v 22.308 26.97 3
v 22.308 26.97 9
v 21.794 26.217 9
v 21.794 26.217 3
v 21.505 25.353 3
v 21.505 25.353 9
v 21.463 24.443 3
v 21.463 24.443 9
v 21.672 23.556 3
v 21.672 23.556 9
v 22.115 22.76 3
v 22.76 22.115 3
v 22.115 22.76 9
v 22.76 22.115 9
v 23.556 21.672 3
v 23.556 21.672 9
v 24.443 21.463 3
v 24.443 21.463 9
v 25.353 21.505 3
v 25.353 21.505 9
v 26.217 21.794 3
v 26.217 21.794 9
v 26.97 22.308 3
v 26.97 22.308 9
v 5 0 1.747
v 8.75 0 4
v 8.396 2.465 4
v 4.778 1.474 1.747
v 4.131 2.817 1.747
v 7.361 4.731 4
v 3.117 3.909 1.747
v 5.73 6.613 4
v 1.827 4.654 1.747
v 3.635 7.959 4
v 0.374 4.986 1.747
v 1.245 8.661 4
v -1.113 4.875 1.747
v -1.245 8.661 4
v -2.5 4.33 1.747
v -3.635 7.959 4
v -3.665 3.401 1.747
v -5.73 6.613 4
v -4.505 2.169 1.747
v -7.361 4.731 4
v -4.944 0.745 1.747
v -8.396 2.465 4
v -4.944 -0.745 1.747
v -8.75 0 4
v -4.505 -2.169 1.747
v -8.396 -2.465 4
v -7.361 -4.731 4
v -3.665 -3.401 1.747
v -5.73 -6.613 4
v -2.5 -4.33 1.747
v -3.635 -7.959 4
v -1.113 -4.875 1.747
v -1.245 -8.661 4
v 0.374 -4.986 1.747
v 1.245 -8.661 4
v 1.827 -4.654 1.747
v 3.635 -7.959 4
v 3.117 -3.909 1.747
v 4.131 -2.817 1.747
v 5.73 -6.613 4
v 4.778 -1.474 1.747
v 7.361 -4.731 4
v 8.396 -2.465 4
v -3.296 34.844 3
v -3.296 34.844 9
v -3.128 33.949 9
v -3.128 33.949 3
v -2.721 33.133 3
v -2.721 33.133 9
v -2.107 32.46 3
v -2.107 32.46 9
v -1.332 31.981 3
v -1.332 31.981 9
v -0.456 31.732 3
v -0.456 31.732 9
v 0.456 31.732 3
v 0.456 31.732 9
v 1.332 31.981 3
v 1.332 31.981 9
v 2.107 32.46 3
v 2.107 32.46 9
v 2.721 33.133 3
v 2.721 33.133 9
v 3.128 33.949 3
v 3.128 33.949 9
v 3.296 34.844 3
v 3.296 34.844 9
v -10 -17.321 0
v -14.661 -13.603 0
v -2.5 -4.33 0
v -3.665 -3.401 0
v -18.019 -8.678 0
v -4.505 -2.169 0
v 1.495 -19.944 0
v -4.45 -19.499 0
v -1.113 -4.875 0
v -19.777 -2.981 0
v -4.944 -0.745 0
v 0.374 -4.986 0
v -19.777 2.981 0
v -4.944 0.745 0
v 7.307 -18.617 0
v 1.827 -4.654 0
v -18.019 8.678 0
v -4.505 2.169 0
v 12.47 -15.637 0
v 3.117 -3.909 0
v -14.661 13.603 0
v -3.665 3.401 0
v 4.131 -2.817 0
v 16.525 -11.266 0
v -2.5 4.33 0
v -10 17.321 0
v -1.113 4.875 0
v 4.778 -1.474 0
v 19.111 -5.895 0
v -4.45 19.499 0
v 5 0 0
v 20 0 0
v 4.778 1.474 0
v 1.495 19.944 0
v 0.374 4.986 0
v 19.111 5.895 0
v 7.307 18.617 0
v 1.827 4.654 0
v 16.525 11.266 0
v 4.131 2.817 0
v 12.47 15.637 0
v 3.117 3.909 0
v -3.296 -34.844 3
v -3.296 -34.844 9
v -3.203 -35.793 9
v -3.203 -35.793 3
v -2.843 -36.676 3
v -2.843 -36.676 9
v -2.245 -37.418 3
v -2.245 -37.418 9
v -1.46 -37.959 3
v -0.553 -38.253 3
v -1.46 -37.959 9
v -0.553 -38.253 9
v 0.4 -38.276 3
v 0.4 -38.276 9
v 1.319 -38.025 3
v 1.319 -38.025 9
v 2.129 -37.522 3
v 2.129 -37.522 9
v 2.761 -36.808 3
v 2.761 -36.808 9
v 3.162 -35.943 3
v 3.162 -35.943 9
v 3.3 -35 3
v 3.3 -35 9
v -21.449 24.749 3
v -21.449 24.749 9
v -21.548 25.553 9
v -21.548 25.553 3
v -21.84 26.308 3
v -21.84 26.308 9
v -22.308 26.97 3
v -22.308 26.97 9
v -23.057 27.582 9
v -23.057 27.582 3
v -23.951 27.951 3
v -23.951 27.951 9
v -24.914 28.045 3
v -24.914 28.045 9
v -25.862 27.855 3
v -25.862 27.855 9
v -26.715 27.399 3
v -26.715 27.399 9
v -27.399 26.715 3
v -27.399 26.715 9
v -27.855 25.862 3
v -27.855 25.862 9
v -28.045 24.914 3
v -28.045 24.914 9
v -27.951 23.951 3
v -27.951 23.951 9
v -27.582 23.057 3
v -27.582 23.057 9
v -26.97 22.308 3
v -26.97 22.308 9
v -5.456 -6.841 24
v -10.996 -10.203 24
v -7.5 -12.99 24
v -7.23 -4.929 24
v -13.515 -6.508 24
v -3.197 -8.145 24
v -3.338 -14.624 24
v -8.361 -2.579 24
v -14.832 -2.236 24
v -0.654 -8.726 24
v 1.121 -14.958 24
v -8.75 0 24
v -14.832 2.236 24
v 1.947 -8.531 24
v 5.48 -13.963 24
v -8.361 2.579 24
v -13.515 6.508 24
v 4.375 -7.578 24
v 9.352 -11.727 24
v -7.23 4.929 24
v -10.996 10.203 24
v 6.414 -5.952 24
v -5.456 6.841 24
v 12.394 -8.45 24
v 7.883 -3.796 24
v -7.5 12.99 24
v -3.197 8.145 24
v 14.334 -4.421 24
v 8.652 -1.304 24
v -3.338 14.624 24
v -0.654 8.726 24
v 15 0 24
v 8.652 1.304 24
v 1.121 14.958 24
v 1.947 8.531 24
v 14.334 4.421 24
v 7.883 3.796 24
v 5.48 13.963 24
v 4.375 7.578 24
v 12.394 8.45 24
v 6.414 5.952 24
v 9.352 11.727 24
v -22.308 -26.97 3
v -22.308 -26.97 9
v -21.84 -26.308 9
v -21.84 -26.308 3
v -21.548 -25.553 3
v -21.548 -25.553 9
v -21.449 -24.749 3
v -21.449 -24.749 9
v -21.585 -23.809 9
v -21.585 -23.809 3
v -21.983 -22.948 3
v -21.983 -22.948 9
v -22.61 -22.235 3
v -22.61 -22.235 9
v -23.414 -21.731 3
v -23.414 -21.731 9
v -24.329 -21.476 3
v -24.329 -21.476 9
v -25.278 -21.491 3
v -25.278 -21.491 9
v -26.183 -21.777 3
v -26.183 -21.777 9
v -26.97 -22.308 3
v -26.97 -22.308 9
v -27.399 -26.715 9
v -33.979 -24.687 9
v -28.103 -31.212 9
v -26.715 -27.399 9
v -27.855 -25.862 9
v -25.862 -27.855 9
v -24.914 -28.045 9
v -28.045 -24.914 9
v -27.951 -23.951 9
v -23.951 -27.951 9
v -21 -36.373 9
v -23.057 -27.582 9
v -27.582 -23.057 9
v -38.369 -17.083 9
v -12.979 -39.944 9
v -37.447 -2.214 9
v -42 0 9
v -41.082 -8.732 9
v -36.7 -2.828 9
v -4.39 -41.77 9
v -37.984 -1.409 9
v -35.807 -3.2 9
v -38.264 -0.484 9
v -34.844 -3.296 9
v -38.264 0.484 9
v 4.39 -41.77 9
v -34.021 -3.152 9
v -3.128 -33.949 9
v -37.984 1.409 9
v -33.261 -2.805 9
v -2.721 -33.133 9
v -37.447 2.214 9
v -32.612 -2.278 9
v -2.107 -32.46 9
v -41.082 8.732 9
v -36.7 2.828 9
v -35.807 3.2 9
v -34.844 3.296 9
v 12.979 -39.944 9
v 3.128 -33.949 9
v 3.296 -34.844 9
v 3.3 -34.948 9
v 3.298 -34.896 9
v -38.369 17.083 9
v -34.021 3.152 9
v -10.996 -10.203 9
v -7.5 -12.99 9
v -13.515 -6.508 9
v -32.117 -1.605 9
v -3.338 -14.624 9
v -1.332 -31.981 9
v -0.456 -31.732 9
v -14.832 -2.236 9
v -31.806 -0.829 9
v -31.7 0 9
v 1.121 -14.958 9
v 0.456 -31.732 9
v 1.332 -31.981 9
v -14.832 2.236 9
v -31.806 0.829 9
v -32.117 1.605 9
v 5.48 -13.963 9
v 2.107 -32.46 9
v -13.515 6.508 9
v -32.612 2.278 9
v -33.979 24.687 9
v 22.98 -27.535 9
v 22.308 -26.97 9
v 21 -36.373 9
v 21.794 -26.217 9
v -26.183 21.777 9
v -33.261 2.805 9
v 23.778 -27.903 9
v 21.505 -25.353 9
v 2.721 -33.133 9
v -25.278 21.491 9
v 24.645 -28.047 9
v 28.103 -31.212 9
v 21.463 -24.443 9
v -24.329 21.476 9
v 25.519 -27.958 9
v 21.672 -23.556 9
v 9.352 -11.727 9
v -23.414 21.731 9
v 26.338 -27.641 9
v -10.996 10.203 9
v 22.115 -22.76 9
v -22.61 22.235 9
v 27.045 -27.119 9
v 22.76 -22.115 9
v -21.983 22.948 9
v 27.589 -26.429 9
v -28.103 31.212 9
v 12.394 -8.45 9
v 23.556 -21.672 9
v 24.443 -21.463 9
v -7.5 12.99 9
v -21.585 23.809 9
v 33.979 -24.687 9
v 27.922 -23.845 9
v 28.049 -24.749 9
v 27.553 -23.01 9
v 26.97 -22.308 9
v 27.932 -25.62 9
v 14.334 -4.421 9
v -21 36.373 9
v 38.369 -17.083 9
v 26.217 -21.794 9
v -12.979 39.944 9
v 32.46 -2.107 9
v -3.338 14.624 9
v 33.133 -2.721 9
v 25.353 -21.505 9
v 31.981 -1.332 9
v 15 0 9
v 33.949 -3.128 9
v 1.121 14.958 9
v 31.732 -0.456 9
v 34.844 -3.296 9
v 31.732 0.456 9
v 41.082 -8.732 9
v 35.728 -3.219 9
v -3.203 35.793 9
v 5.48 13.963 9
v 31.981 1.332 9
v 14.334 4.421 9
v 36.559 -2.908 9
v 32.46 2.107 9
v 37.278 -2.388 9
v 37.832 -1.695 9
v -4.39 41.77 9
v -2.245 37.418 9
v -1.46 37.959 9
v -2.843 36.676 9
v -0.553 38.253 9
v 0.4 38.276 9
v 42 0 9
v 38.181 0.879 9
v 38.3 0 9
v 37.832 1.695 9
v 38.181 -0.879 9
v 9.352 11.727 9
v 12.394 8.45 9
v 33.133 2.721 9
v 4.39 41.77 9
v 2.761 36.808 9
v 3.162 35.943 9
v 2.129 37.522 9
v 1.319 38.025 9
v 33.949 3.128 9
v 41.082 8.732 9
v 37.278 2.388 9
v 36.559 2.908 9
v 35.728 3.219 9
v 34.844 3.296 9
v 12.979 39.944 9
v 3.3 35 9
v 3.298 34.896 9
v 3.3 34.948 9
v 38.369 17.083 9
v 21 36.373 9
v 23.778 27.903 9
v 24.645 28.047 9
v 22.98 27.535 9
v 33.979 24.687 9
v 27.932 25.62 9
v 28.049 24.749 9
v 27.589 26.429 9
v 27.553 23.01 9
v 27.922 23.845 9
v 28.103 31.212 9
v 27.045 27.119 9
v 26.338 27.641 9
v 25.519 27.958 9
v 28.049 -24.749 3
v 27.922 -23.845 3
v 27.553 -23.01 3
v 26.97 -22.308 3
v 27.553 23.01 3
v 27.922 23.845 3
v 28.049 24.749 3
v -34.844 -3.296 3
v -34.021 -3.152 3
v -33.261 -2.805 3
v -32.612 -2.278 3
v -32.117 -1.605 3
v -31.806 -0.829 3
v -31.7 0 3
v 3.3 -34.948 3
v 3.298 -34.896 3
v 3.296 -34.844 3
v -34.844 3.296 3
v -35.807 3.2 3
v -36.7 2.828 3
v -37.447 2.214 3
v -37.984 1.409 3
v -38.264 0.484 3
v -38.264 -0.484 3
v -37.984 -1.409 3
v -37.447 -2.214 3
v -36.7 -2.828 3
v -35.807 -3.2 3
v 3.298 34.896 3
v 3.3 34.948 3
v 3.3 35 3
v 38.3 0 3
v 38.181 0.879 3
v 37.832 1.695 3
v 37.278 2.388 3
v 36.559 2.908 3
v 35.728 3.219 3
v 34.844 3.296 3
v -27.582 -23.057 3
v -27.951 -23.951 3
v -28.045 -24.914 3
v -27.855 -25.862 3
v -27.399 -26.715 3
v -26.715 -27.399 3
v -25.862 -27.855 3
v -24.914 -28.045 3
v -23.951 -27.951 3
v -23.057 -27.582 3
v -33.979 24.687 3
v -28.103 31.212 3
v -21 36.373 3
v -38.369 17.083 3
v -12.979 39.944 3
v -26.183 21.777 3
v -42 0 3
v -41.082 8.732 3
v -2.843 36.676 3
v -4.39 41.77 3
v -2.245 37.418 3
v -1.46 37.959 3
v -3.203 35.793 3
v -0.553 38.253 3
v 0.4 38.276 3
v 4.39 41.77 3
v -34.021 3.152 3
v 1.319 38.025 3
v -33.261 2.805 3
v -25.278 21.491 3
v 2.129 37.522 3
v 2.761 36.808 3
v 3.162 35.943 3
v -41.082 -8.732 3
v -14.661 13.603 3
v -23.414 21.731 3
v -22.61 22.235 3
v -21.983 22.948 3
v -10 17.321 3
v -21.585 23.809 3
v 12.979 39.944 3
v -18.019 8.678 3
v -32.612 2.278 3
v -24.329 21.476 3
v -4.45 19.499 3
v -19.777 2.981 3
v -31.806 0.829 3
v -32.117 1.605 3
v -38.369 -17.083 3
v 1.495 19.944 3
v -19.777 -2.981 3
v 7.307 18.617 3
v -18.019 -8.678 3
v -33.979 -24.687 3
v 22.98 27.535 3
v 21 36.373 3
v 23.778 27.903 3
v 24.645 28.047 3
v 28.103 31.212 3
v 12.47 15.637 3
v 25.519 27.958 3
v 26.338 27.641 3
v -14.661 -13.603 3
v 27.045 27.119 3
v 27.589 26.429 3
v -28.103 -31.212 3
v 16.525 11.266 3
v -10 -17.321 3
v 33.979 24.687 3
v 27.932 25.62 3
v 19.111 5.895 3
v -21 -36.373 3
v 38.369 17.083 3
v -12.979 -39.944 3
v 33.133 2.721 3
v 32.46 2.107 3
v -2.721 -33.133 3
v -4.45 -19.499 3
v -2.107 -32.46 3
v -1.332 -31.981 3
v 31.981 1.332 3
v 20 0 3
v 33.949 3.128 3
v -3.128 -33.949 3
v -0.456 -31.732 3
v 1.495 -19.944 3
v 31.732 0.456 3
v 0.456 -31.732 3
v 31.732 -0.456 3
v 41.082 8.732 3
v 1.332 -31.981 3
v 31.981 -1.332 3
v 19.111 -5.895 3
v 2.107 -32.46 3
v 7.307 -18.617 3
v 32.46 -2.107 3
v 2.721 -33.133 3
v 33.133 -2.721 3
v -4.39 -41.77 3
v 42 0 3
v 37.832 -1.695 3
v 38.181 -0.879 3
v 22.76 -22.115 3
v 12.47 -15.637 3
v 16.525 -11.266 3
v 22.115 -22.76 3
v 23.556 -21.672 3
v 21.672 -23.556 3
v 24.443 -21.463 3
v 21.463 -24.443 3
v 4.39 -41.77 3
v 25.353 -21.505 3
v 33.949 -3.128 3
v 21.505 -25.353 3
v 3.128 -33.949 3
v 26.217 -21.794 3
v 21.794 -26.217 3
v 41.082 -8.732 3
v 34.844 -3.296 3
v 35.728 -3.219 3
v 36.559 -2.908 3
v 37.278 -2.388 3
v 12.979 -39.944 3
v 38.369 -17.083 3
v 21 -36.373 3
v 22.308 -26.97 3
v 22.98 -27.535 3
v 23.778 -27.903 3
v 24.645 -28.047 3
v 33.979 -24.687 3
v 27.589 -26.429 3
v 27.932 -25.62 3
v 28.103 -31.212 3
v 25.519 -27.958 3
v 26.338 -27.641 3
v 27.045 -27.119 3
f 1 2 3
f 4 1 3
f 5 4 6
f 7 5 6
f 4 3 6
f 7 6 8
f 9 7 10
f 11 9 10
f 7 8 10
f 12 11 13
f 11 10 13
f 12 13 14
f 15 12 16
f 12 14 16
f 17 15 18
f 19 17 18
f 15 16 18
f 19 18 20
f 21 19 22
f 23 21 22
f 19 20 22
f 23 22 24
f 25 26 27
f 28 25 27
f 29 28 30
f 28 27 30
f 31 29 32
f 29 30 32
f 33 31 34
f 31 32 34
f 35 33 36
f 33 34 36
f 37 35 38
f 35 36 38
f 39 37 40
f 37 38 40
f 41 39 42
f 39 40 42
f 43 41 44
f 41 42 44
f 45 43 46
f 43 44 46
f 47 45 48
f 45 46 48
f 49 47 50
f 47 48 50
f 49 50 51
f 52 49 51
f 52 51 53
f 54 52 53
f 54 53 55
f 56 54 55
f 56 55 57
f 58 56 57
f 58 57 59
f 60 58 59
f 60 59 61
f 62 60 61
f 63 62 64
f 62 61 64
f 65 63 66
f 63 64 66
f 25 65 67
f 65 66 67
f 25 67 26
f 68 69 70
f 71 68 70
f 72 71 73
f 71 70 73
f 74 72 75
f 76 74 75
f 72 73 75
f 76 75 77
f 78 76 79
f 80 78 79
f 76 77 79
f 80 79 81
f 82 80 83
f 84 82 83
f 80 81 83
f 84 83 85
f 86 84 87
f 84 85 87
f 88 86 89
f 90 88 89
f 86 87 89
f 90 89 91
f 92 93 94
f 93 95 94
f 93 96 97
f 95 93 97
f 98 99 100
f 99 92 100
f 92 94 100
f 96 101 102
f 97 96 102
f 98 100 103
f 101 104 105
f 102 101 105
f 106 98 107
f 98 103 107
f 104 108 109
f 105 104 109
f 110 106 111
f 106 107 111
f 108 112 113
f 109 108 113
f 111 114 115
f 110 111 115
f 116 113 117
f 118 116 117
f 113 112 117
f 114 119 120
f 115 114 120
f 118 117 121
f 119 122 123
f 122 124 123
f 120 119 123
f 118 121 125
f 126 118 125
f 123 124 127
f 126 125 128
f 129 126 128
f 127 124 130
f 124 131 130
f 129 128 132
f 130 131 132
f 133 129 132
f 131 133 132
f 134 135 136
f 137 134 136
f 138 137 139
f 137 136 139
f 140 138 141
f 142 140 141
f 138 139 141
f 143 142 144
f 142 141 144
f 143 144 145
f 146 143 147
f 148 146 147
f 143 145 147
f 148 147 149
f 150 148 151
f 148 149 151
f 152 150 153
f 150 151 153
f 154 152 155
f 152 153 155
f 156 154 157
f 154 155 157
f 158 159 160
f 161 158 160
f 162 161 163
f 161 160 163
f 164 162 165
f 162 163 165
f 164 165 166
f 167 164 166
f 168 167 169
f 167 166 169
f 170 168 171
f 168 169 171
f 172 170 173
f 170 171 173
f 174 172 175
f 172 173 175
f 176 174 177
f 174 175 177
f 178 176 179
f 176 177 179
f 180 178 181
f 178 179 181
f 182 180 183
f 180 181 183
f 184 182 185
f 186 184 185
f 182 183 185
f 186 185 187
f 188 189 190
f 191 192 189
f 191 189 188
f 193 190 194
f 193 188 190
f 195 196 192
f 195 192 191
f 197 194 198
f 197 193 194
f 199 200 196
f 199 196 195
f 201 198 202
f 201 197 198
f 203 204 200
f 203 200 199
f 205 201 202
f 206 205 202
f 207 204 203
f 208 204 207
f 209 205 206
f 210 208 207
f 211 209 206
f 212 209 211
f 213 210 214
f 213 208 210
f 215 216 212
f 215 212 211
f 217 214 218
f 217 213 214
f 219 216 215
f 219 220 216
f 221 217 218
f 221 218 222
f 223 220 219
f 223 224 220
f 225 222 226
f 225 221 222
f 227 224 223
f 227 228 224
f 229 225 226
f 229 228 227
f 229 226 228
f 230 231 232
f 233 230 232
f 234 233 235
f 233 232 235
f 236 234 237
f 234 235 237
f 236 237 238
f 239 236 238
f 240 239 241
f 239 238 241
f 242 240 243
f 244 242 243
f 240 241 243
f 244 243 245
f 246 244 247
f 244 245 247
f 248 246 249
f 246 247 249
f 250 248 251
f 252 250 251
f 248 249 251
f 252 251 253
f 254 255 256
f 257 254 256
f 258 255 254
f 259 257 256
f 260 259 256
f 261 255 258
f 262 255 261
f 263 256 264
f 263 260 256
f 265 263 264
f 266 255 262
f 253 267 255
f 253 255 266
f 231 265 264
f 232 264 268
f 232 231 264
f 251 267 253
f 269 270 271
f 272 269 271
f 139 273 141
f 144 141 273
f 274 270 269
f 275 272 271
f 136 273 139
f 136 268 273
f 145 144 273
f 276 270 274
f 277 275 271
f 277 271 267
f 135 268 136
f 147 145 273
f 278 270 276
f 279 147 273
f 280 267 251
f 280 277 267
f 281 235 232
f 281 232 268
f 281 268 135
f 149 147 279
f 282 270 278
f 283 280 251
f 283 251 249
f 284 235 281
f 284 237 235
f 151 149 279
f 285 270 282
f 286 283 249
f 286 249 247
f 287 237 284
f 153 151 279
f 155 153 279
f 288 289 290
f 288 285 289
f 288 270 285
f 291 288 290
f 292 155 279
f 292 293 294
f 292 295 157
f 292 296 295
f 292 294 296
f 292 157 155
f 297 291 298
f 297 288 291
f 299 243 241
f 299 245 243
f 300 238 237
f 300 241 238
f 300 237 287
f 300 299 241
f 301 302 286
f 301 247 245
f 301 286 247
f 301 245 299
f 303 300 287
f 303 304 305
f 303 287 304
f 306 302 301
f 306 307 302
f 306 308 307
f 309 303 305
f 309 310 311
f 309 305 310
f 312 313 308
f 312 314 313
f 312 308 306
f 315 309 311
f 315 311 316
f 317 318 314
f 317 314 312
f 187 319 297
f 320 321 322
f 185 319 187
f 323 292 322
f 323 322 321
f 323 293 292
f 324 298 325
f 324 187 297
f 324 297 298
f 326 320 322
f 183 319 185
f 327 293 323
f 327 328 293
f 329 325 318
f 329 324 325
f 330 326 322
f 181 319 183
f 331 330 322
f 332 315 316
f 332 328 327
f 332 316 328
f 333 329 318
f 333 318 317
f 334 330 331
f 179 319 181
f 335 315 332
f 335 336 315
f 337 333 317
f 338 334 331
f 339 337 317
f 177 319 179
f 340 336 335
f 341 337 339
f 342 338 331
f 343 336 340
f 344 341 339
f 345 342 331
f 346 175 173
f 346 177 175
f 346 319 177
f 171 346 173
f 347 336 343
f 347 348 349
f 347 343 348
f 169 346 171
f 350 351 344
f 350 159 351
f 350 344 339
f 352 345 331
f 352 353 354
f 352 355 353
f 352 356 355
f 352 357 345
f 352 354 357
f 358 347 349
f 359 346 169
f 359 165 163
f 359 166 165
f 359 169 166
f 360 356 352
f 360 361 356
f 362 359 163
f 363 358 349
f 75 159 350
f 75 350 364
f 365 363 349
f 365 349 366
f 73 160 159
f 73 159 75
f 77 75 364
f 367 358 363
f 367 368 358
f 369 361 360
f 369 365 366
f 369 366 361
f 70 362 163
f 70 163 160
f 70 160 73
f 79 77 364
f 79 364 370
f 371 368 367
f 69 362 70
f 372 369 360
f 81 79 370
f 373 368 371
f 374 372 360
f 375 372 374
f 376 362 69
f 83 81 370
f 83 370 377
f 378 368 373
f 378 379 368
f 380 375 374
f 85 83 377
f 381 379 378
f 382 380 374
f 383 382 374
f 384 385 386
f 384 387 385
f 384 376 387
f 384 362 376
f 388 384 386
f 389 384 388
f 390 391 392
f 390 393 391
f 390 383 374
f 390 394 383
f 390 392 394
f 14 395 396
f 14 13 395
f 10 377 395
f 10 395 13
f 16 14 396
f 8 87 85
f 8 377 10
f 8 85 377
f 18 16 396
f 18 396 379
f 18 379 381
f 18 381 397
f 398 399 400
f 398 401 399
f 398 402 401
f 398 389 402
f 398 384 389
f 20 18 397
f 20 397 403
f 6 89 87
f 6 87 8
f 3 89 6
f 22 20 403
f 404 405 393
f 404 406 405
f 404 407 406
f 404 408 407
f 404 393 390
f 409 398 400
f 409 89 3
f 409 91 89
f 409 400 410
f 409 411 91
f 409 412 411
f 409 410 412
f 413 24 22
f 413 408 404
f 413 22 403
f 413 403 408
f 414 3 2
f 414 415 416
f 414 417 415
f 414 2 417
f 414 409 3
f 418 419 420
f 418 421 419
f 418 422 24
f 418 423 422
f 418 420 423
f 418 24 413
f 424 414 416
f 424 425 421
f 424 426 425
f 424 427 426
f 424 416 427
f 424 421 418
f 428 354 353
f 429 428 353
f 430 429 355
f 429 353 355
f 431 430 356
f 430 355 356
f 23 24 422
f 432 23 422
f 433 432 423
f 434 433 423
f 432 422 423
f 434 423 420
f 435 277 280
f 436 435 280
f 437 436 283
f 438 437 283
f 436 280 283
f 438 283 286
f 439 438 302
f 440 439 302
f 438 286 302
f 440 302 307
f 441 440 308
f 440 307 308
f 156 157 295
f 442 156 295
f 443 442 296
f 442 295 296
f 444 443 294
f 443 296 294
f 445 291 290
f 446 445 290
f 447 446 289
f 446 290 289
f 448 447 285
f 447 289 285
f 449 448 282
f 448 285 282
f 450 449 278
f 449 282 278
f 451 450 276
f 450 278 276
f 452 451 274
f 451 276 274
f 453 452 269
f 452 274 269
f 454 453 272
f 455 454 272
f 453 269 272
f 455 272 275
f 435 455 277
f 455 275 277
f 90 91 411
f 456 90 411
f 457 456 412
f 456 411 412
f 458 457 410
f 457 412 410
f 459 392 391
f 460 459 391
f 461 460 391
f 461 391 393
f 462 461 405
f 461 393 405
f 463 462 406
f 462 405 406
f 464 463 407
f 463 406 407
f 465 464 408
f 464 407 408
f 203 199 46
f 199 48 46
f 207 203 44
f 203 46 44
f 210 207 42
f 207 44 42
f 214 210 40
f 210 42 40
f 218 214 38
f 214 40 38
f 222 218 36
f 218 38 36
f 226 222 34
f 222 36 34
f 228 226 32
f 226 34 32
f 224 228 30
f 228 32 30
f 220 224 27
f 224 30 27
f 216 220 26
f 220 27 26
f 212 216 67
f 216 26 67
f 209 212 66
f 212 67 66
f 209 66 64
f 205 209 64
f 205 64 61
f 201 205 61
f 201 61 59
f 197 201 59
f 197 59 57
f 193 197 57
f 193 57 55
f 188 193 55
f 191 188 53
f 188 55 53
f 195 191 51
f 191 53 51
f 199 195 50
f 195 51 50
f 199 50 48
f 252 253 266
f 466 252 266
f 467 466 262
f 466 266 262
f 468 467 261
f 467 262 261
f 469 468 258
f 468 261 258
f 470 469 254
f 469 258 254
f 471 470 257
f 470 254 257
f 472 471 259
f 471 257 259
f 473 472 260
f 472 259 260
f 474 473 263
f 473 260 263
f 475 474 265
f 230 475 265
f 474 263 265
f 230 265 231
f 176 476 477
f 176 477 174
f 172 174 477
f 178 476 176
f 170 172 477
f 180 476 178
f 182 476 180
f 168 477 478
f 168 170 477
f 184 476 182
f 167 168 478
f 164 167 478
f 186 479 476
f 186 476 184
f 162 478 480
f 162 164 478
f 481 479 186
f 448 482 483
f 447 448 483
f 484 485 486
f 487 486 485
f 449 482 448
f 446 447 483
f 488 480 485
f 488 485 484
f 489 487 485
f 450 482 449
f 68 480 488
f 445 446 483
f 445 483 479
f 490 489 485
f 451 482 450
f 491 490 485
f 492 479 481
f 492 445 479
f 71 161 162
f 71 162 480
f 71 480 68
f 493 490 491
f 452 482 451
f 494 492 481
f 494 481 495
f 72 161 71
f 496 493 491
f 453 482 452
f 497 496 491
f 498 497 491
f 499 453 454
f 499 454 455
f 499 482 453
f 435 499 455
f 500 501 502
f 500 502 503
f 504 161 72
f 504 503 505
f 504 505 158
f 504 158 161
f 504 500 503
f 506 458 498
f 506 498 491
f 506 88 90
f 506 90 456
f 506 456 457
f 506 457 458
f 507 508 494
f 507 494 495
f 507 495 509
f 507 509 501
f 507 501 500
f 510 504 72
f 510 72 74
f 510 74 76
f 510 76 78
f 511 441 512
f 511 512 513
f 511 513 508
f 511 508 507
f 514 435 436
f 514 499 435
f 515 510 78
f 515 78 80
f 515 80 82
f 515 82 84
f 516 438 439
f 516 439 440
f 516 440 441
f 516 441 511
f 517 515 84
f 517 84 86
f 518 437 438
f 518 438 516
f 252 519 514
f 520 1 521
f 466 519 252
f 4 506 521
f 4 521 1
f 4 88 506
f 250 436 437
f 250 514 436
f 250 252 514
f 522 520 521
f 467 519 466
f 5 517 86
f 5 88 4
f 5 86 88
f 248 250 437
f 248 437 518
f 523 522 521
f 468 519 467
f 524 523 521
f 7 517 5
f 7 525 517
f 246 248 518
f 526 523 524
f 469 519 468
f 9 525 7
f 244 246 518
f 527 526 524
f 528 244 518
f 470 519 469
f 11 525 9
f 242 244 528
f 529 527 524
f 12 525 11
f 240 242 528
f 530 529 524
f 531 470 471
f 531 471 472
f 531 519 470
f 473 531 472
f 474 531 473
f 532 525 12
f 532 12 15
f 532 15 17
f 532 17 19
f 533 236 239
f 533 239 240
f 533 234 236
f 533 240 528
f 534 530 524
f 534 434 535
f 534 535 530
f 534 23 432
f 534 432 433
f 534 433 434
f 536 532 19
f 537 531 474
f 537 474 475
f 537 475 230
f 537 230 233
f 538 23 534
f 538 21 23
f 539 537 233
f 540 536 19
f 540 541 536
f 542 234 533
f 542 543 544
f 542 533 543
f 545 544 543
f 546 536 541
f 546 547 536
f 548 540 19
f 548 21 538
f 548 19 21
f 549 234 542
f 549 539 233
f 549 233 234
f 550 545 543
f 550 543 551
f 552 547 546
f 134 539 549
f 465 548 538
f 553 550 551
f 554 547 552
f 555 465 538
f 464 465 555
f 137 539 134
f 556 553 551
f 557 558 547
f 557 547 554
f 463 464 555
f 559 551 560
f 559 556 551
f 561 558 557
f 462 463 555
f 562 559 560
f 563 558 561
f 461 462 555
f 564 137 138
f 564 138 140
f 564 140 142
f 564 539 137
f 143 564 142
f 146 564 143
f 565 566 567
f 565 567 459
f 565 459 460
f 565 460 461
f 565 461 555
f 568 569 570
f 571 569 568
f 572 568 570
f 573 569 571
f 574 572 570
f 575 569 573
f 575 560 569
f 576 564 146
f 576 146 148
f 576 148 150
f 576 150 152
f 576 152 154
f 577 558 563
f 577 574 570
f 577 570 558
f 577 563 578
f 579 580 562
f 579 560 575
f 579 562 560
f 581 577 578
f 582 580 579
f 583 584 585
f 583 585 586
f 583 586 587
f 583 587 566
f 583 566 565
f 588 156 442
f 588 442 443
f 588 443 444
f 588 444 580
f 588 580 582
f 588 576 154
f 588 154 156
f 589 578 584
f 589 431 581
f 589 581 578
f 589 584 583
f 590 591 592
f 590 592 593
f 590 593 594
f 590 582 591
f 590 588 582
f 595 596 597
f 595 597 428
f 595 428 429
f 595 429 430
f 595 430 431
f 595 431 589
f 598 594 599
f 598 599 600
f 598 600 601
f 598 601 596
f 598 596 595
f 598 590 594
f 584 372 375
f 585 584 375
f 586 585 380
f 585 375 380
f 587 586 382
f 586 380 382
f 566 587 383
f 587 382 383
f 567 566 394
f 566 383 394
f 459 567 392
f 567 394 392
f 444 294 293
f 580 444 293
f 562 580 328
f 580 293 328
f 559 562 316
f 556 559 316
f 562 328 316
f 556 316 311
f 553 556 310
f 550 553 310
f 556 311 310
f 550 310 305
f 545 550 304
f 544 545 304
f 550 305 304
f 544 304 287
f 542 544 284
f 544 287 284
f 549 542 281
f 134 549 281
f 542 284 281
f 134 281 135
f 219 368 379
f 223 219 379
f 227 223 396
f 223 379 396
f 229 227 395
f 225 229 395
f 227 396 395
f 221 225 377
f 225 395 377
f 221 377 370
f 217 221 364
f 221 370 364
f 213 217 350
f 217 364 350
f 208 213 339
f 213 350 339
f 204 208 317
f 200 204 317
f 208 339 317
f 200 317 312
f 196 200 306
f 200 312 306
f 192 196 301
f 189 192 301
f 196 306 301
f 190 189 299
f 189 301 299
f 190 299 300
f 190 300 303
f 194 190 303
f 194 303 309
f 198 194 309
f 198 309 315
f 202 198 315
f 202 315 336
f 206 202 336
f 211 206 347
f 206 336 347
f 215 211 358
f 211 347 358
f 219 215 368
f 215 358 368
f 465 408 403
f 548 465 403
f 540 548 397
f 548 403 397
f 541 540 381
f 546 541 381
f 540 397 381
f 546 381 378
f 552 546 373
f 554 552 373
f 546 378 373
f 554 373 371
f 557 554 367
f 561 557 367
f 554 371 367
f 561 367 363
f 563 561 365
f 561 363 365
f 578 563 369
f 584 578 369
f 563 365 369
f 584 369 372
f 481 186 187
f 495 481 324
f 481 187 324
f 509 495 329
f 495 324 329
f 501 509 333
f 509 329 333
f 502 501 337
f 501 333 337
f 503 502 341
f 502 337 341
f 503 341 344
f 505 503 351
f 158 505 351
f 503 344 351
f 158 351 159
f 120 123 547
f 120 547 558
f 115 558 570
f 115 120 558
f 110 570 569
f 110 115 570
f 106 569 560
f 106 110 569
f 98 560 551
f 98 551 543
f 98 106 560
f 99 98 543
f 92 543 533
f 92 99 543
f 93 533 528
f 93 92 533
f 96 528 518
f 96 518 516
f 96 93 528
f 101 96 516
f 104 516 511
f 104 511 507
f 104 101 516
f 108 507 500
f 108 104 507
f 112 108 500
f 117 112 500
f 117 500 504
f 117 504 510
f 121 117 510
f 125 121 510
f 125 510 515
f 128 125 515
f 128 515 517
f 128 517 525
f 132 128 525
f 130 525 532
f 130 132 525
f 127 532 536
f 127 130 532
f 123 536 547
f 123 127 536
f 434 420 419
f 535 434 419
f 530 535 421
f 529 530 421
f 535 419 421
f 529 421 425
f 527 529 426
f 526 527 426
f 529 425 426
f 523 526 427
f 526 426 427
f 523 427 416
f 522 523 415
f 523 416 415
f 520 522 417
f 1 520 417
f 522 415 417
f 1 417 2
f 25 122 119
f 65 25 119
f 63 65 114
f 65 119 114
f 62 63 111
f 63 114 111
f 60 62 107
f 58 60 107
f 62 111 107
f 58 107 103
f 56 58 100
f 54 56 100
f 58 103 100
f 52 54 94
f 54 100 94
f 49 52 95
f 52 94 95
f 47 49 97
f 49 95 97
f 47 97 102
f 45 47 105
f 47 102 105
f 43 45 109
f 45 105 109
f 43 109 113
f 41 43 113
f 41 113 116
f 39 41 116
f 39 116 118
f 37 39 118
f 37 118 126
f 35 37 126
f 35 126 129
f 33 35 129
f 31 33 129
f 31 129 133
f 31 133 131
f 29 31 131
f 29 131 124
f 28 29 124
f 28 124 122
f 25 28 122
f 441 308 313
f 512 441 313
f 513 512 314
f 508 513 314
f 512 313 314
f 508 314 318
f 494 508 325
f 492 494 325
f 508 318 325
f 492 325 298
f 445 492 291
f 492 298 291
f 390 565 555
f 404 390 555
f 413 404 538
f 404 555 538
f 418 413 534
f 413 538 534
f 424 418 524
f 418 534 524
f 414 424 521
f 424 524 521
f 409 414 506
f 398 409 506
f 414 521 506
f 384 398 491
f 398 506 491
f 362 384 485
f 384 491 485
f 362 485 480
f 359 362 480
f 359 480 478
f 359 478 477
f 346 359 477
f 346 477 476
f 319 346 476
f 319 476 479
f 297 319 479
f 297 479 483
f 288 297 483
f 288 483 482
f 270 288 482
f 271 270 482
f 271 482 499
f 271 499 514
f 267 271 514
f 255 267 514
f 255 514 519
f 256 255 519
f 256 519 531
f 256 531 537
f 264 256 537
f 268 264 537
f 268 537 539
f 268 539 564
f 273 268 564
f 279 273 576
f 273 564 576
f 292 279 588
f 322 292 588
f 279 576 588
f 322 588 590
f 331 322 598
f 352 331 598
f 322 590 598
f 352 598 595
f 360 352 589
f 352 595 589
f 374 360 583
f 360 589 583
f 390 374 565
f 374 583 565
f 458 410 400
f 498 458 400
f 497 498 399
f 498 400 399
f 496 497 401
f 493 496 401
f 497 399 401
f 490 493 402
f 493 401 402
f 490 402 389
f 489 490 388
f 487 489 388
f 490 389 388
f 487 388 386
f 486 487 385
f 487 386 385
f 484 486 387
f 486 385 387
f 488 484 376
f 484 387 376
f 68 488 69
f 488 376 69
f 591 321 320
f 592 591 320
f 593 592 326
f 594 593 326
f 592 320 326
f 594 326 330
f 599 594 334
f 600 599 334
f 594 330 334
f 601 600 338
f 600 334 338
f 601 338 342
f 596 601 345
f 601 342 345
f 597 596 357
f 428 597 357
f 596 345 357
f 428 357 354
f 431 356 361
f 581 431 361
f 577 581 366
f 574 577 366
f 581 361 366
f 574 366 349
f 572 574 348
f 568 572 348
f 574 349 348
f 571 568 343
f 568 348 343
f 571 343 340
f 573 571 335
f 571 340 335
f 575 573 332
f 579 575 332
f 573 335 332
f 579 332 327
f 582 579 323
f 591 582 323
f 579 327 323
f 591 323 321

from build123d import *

# Parameters (mm, degrees)
F0_R      = 42
F1_DEPTH  = 9
F2_R      = 42
F2_R_2    = 20
F3_DEPTH  = 3
F4_R      = 15
F5_DEPTH  = 15
F8_DEPTH  = 25
F9_R      = 5
F10_DEPTH = 24.001
F11_D     = 17.5
F11_DEPTH = 20
F11_TIP   = 5.2575304165


with BuildPart() as f1:
    # F0 (on Top) → F1 (new body)
    with BuildSketch(Plane.XY):
        Circle(F0_R)
    extrude(amount=F1_DEPTH)

    # F2 (on face) → F3 (cut)
    with BuildSketch(Plane(origin=(0, 0, 0), x_dir=(1, 0, 0), z_dir=(0, 0, -1))):
        Circle(F2_R)
        Circle(F2_R_2, mode=Mode.SUBTRACT)
    extrude(amount=-F3_DEPTH, mode=Mode.SUBTRACT)

    # F4 (on face) → F5 (join)
    with BuildSketch(Plane.XY.offset(9)):
        Circle(F4_R)
    extrude(amount=F5_DEPTH)

    # F7 (on face) → F8 (cut)
    with BuildSketch(Plane.XY.offset(9)):
        with BuildLine():
            ThreePointArc((-3.2963309195, 34.8444285714), (0, 31.7), (3.2963309195, 34.8444285714))
            ThreePointArc((3.2963309195, 34.8444285714), (0, 35), (-3.2963309195, 34.8444285714))
        make_face()
        with BuildLine():
            ThreePointArc((-3.2963309195, 34.8444285714), (0, 35), (3.2963309195, 34.8444285714))
            ThreePointArc((3.2963309195, 34.8444285714), (3.2990826023, 34.9221926553), (3.3, 35))
            ThreePointArc((3.3, 35), (-0.0778073447, 38.2990826023), (-3.2963309195, 34.8444285714))
        make_face()
        with BuildLine():
            ThreePointArc((-21.4487373415, 24.7487373415), (-21.6710068674, 25.9393569822), (-22.3078737832, 26.9695896756))
            ThreePointArc((-22.3078737832, 26.9695896756), (-24.7487373415, 24.7487373415), (-26.9695896756, 22.3078737832))
            ThreePointArc((-26.9695896756, 22.3078737832), (-23.4143484744, 21.7305580309), (-21.4487373415, 24.7487373415))
        make_face()
        with BuildLine():
            ThreePointArc((-26.9695896756, 22.3078737832), (-24.7487373415, 24.7487373415), (-22.3078737832, 26.9695896756))
            ThreePointArc((-22.3078737832, 26.9695896756), (-27.0821897194, 27.0821897194), (-26.9695896756, 22.3078737832))
        make_face()
        with BuildLine():
            ThreePointArc((-31.7, 0), (-32.6121782191, 2.2777855788), (-34.8444285714, 3.2963309195))
            ThreePointArc((-34.8444285714, 3.2963309195), (-35, 0), (-34.8444285714, -3.2963309195))
            ThreePointArc((-34.8444285714, -3.2963309195), (-32.6121782191, -2.2777855788), (-31.7, 0))
        make_face()
        with BuildLine():
            ThreePointArc((-34.8444285714, -3.2963309195), (-35, 0), (-34.8444285714, 3.2963309195))
            ThreePointArc((-34.8444285714, 3.2963309195), (-38.3, 0), (-34.8444285714, -3.2963309195))
        make_face()
        with BuildLine():
            ThreePointArc((-26.9695896756, -22.3078737832), (-27.0821897194, -27.0821897194), (-22.3078737832, -26.9695896756))
            ThreePointArc((-22.3078737832, -26.9695896756), (-24.7487373415, -24.7487373415), (-26.9695896756, -22.3078737832))
        make_face()
        with BuildLine():
            ThreePointArc((-26.9695896756, -22.3078737832), (-24.7487373415, -24.7487373415), (-22.3078737832, -26.9695896756))
            ThreePointArc((-22.3078737832, -26.9695896756), (-21.6710068674, -25.9393569822), (-21.4487373415, -24.7487373415))
            ThreePointArc((-21.4487373415, -24.7487373415), (-23.4143484744, -21.7305580309), (-26.9695896756, -22.3078737832))
        make_face()
        with BuildLine():
            ThreePointArc((-3.2963309195, -34.8444285714), (0, -35), (3.2963309195, -34.8444285714))
            ThreePointArc((3.2963309195, -34.8444285714), (0, -31.7), (-3.2963309195, -34.8444285714))
        make_face()
        with BuildLine():
            ThreePointArc((3.3, -35), (3.2990826023, -34.9221926553), (3.2963309195, -34.8444285714))
            ThreePointArc((3.2963309195, -34.8444285714), (0, -35), (-3.2963309195, -34.8444285714))
            ThreePointArc((-3.2963309195, -34.8444285714), (-0.0778073447, -38.2990826023), (3.3, -35))
        make_face()
        with BuildLine():
            ThreePointArc((28.0487373415, -24.7487373415), (27.7669166522, -23.4143484744), (26.9695896756, -22.3078737832))
            ThreePointArc((26.9695896756, -22.3078737832), (24.7487373415, -24.7487373415), (22.3078737832, -26.9695896756))
            ThreePointArc((22.3078737832, -26.9695896756), (25.9393569822, -27.8264678156), (28.0487373415, -24.7487373415))
        make_face()
        with BuildLine():
            ThreePointArc((22.3078737832, -26.9695896756), (24.7487373415, -24.7487373415), (26.9695896756, -22.3078737832))
            ThreePointArc((26.9695896756, -22.3078737832), (22.4152849636, -22.4152849636), (22.3078737832, -26.9695896756))
        make_face()
        with BuildLine():
            ThreePointArc((34.8444285714, 3.2963309195), (34.9610855095, 1.65), (35, 0))
            ThreePointArc((35, 0), (34.9610855095, -1.65), (34.8444285714, -3.2963309195))
            ThreePointArc((34.8444285714, -3.2963309195), (37.2777855788, -2.3878217809), (38.3, 0))
            ThreePointArc((38.3, 0), (37.2777855788, 2.3878217809), (34.8444285714, 3.2963309195))
        make_face()
        with BuildLine():
            ThreePointArc((34.8444285714, -3.2963309195), (34.9610855095, -1.65), (35, 0))
            ThreePointArc((35, 0), (34.9610855095, 1.65), (34.8444285714, 3.2963309195))
            ThreePointArc((34.8444285714, 3.2963309195), (31.7, 0), (34.8444285714, -3.2963309195))
        make_face()
        with BuildLine():
            ThreePointArc((22.3078737832, 26.9695896756), (22.4152849636, 22.4152849636), (26.9695896756, 22.3078737832))
            ThreePointArc((26.9695896756, 22.3078737832), (24.7487373415, 24.7487373415), (22.3078737832, 26.9695896756))
        make_face()
        with BuildLine():
            ThreePointArc((22.3078737832, 26.9695896756), (24.7487373415, 24.7487373415), (26.9695896756, 22.3078737832))
            ThreePointArc((26.9695896756, 22.3078737832), (27.7669166522, 23.4143484744), (28.0487373415, 24.7487373415))
            ThreePointArc((28.0487373415, 24.7487373415), (25.9393569822, 27.8264678156), (22.3078737832, 26.9695896756))
        make_face()
    extrude(amount=-F8_DEPTH, mode=Mode.SUBTRACT)

    # F9 (on face) → F10 (cut, through all)
    with BuildSketch(Plane(origin=(0, 0, 0), x_dir=(1, 0, 0), z_dir=(0, 0, -1))):
        Circle(F9_R)
    extrude(amount=-F10_DEPTH, mode=Mode.SUBTRACT)

    # F11
    with Locations(Plane.XY.offset(24)):
        with Locations((0, 0)):
            Hole(F11_D / 2, depth=F11_DEPTH)
            with Locations((0, 0, -(F11_DEPTH + F11_TIP / 2))):  # 118° drill point
                Cone(0, F11_D / 2, F11_TIP, mode=Mode.SUBTRACT)


solid = f1.part
